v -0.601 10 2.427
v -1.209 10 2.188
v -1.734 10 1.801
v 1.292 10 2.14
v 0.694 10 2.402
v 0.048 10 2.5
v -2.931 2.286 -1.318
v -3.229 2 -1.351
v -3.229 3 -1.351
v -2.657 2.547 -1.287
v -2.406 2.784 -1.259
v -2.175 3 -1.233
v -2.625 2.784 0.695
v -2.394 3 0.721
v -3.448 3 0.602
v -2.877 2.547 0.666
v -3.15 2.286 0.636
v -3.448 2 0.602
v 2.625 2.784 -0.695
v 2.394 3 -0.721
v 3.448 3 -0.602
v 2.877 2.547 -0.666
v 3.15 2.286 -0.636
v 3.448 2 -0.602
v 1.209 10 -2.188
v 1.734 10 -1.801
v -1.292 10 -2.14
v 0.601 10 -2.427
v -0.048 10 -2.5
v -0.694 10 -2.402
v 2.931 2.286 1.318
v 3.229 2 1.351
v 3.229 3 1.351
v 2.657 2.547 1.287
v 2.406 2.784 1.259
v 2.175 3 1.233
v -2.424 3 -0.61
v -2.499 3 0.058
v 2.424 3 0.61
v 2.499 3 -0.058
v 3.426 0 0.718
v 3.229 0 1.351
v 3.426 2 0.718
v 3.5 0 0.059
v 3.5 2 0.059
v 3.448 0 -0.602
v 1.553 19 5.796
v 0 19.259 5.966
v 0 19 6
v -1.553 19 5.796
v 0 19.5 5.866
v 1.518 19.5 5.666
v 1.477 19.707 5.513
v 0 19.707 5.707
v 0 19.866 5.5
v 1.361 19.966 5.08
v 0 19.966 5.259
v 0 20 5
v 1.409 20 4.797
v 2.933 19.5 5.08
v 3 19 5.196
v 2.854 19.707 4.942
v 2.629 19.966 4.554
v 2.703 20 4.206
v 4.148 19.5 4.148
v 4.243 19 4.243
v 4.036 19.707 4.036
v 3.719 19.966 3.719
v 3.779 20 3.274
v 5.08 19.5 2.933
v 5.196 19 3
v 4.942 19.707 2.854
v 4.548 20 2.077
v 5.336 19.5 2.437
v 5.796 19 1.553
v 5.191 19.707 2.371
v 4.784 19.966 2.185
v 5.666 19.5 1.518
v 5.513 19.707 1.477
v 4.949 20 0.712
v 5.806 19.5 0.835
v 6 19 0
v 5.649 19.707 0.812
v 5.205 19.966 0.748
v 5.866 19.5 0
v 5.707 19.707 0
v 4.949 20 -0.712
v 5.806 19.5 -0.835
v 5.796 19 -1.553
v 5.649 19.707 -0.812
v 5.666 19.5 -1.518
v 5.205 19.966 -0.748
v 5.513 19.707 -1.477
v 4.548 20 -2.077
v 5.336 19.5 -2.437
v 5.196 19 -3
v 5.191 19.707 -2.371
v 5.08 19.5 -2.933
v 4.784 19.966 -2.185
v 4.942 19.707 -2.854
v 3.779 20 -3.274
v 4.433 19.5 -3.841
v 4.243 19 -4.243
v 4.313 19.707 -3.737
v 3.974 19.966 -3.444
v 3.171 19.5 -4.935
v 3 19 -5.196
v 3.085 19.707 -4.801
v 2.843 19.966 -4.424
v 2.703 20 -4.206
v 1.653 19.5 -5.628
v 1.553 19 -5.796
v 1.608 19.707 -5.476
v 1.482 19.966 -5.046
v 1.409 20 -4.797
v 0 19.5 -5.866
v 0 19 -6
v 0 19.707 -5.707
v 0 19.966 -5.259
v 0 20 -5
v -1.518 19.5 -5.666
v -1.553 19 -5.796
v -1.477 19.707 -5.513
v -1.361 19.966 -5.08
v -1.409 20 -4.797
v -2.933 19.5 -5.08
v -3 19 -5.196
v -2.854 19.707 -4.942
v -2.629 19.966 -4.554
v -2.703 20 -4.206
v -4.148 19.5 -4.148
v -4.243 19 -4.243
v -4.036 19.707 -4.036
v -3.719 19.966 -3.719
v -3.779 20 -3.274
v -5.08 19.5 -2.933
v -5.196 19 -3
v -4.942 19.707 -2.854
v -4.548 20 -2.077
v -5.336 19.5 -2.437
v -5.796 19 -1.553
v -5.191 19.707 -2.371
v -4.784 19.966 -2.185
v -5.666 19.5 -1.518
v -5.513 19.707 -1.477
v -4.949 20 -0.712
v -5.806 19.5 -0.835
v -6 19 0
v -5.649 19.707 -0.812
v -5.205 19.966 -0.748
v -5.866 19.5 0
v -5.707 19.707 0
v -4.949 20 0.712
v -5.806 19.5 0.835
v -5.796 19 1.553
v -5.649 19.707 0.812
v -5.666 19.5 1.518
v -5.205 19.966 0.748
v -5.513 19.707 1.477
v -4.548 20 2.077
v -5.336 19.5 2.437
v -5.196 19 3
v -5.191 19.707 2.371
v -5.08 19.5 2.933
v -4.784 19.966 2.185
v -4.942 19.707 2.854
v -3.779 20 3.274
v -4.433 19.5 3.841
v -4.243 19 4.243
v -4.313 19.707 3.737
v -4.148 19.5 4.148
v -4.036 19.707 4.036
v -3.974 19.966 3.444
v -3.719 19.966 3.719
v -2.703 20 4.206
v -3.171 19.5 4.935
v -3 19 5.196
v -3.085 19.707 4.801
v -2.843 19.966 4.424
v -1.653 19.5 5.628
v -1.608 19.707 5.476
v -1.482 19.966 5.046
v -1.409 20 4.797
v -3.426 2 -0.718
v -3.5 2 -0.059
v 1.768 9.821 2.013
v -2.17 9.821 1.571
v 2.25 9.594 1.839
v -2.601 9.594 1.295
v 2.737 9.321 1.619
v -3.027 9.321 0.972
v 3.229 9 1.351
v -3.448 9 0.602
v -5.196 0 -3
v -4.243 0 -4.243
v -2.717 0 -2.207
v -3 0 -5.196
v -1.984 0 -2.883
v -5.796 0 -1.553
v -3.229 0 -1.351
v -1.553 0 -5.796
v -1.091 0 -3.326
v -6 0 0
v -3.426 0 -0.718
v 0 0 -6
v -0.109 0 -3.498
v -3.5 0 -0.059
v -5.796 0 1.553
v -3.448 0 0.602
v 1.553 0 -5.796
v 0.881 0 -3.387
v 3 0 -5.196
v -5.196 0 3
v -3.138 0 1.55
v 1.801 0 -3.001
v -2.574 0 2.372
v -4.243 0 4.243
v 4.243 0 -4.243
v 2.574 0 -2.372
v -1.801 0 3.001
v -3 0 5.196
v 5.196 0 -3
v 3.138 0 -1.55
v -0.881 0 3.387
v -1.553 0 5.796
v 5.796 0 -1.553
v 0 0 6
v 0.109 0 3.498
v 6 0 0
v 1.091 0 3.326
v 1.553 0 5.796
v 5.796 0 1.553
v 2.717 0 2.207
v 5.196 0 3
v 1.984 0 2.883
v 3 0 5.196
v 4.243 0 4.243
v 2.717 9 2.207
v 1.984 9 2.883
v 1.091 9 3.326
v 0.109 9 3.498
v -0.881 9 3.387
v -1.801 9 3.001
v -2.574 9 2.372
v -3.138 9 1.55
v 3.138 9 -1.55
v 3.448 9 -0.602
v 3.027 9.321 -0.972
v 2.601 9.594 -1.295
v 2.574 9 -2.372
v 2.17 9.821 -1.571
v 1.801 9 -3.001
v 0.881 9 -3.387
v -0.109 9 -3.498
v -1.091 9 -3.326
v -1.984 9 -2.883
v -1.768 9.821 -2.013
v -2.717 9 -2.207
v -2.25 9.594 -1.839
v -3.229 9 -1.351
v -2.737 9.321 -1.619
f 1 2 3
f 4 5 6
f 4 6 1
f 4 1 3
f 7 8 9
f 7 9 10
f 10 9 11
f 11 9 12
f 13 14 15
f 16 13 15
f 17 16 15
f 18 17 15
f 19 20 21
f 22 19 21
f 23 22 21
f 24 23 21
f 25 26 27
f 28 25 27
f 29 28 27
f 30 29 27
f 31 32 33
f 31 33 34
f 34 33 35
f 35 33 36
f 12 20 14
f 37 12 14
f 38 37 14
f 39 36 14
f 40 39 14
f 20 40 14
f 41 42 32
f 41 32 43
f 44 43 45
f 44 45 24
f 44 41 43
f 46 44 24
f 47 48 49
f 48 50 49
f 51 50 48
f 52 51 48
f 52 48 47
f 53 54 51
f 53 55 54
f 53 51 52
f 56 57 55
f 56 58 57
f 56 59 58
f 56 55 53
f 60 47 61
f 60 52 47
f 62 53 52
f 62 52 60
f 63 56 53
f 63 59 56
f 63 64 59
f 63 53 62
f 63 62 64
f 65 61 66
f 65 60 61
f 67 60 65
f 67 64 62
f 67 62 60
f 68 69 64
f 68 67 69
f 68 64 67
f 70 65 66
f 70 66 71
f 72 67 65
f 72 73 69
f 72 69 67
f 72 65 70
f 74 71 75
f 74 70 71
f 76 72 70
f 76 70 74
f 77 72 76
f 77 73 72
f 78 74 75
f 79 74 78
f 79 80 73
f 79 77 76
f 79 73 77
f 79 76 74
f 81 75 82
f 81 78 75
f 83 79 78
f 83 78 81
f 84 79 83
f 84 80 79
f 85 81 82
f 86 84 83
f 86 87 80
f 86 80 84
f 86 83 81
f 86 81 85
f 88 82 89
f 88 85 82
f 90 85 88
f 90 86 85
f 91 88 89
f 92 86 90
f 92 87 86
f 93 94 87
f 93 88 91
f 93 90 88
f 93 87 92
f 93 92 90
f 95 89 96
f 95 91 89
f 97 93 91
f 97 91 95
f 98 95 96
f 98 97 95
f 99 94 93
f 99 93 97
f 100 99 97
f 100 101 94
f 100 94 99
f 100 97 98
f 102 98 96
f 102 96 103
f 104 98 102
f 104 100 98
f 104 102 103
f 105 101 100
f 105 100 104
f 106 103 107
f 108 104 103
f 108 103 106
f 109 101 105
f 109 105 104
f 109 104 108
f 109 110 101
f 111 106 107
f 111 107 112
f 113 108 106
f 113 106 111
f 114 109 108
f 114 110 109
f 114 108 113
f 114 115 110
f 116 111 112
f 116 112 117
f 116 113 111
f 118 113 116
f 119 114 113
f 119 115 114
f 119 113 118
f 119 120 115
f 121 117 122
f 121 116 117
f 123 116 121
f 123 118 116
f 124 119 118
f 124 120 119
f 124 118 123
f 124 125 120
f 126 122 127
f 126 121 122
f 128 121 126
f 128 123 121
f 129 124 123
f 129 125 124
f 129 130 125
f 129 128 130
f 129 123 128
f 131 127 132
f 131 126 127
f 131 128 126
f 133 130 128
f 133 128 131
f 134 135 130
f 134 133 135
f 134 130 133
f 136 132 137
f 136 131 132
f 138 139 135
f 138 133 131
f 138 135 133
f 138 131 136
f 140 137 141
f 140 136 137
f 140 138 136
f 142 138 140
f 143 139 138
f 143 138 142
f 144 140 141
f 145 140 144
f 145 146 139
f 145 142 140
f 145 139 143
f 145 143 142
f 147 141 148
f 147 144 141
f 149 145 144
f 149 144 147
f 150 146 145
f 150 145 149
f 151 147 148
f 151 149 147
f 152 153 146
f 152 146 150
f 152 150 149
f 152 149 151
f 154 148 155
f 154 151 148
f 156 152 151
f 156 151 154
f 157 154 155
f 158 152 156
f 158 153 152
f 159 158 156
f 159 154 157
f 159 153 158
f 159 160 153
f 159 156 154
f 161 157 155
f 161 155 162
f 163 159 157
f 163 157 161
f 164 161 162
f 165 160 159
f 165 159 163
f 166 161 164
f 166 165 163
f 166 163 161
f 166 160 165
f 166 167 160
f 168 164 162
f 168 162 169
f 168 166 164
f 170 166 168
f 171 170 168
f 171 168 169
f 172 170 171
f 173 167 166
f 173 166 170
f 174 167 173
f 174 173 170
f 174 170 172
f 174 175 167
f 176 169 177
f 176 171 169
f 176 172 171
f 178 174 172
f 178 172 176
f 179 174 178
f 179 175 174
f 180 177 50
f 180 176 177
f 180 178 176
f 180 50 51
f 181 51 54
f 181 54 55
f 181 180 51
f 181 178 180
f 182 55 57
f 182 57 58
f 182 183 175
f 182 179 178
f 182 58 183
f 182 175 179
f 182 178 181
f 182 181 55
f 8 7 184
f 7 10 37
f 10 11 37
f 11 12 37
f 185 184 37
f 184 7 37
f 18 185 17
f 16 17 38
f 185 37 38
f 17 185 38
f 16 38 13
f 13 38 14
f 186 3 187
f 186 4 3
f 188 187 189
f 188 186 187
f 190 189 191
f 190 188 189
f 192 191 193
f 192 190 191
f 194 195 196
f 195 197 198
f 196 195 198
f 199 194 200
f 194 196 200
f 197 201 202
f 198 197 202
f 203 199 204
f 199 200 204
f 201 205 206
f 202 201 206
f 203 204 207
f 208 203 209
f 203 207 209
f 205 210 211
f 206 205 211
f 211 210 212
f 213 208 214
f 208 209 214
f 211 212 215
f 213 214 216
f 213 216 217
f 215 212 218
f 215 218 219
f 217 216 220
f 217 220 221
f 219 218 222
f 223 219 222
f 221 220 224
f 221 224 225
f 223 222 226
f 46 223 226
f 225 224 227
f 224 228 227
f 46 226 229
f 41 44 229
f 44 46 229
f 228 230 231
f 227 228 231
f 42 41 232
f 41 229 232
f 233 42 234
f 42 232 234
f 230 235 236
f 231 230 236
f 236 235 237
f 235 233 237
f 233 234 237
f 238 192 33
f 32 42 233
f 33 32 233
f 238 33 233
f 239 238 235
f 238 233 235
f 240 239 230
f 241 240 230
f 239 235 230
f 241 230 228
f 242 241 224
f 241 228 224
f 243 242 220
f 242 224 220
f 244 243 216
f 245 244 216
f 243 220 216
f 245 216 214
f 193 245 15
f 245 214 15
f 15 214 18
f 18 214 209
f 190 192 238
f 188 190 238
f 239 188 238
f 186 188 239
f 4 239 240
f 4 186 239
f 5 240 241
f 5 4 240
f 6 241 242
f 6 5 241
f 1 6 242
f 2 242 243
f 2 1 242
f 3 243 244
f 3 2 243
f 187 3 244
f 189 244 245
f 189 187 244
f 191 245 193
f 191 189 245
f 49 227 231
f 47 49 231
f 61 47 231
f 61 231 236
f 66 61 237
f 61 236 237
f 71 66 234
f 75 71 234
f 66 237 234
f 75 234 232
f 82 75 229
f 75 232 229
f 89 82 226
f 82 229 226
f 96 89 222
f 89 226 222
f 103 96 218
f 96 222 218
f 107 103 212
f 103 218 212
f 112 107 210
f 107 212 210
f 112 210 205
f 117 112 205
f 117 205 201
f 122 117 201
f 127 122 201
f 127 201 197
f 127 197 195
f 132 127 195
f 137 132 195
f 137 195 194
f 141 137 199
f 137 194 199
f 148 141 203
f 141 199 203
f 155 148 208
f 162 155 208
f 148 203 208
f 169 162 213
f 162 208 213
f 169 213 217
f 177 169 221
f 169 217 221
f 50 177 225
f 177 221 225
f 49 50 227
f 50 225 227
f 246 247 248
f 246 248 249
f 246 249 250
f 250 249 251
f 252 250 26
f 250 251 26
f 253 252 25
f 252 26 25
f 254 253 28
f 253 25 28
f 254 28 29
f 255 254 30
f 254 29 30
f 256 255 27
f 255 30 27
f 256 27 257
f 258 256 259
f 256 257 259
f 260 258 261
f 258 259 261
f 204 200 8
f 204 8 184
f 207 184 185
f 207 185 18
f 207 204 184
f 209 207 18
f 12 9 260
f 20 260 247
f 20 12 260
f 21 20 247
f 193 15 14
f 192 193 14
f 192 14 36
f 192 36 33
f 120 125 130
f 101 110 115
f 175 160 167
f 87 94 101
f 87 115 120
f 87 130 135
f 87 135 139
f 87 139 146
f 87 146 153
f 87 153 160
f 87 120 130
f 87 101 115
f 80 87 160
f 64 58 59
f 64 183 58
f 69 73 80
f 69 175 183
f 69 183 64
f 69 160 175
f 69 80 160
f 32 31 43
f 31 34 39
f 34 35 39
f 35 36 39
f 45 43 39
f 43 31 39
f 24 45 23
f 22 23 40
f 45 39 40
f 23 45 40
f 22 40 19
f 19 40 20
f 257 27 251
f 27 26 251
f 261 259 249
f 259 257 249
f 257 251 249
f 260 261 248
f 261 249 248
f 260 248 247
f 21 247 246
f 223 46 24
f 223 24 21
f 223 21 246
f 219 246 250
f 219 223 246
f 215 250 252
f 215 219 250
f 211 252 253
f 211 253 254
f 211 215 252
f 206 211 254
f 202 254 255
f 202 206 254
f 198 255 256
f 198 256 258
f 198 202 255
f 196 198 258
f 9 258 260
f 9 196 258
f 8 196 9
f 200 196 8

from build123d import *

# Parameters (mm, degrees)
SKETCH1_R           = 6
BOSS_EXTRUDE1_DEPTH = 20
CUT_EXTRUDE1_DEPTH  = 10
CUT_EXTRUDE2_DEPTH  = 3
CHAMFER1_SIZE       = 1
CHAMFER2_SIZE       = 1
FILLET1_R           = 1


with BuildPart() as part:
    # Sketch1 → Boss-Extrude1 (new body)
    with BuildSketch(Plane(origin=(0, 0, 0), x_dir=(1, 0, 0), z_dir=(0, 1, 0))):
        with Locations(Location((0, 0, 0), (0, 0, 270))):
            Circle(SKETCH1_R)
    extrude(amount=BOSS_EXTRUDE1_DEPTH)

    # Sketch2 → Cut-Extrude1 (cut)
    with BuildSketch(Plane.XZ):
        with BuildLine():
            Line((-3.228638435, -1.351256398), (3.447764562, -0.602428024))
            ThreePointArc((3.447764562, -0.602428024), (0.390115429, -3.478190615), (-3.228638435, -1.351256398))
        make_face()
        with BuildLine():
            Line((-3.447764562, 0.602428024), (3.228638435, 1.351256398))
            ThreePointArc((3.228638435, 1.351256398), (-0.390115429, 3.478190615), (-3.447764562, 0.602428024))
        make_face()
    extrude(amount=-CUT_EXTRUDE1_DEPTH, mode=Mode.SUBTRACT)

    # Sketch3 → Cut-Extrude2 (cut)
    with BuildSketch(Plane.XZ):
        with BuildLine():
            Line((-3.447764562, 0.602428024), (3.228638435, 1.351256398))
            ThreePointArc((3.228638435, 1.351256398), (3.478190615, 0.390115429), (3.447764562, -0.602428024))
            Line((3.447764562, -0.602428024), (-3.228638435, -1.351256398))
            ThreePointArc((-3.228638435, -1.351256398), (-3.478190615, -0.390115429), (-3.447764562, 0.602428024))
        make_face()
    extrude(amount=-CUT_EXTRUDE2_DEPTH, mode=Mode.SUBTRACT)

    # Chamfer1
    chamfer1_edges = [part.edges().sort_by_distance(p)[0] for p in [
        (-0.390115429, 10, 3.478190615),
        (-0.109563063, 10, 0.976842211),
        (0.390115429, 10, -3.478190615),
        (0.109563063, 10, -0.976842211),
    ]]
    chamfer(chamfer1_edges, length=CHAMFER1_SIZE)

    # Chamfer2
    # the kernel refuses this chamfer: 1 mm, written as the material it adds along each edge
    with BuildSketch(Plane(origin=(0, 3, 0), x_dir=(-0.42559561828763903, 0, -0.9049134597818524), z_dir=(0.9049134597818524, 0, -0.42559561828763903))) as chamfer2_piece_1_section:
        Polygon((3.5, -CHAMFER2_SIZE), (3.5 - CHAMFER2_SIZE, 0), (3.5, 0), align=None)
    chamfer2_piece_1 = revolve(axis=Axis((0, 3, 0), (0, 1, 0)), revolution_arc=116.82411124, mode=Mode.PRIVATE)
    chamfer2_piece_1 = split(chamfer2_piece_1, bisect_by=Plane(origin=(-2.987774237, 2.670615871, -1.324240961), z_dir=(-0.11146155122457255, 0, 0.9937687470425964)), keep=Keep.TOP, mode=Mode.PRIVATE)
    chamfer2_piece_1 = split(chamfer2_piece_1, bisect_by=Plane(origin=(-3.206900364, 2.670615871, 0.629443462), z_dir=(0.11146155122457255, 0, -0.9937687470425964)), keep=Keep.TOP, mode=Mode.PRIVATE)
    add(chamfer2_piece_1)
    with BuildSketch(Plane(origin=(0, 3, 0), x_dir=(0.4255956182876634, 0, 0.904913459781841), z_dir=(-0.904913459781841, 0, 0.4255956182876634))) as chamfer2_piece_2_section:
        Polygon((3.5, -CHAMFER2_SIZE), (3.5 - CHAMFER2_SIZE, 0), (3.5, 0), align=None)
    chamfer2_piece_2 = revolve(axis=Axis((0, 3, 0), (0, 1, 0)), revolution_arc=116.82411124, mode=Mode.PRIVATE)
    chamfer2_piece_2 = split(chamfer2_piece_2, bisect_by=Plane(origin=(3.206900364, 2.670615871, -0.629443462), z_dir=(-0.11146155122457255, 0, 0.9937687470425964)), keep=Keep.TOP, mode=Mode.PRIVATE)
    chamfer2_piece_2 = split(chamfer2_piece_2, bisect_by=Plane(origin=(2.987774237, 2.670615871, 1.324240961), z_dir=(0.11146155122457255, 0, -0.9937687470425964)), keep=Keep.TOP, mode=Mode.PRIVATE)
    add(chamfer2_piece_2)

    # Fillet1
    fillet1_edges = [part.edges().sort_by_distance(p)[0] for p in [
        (0, 20, -6),
    ]]
    fillet(fillet1_edges, radius=FILLET1_R)


solid = part.part
